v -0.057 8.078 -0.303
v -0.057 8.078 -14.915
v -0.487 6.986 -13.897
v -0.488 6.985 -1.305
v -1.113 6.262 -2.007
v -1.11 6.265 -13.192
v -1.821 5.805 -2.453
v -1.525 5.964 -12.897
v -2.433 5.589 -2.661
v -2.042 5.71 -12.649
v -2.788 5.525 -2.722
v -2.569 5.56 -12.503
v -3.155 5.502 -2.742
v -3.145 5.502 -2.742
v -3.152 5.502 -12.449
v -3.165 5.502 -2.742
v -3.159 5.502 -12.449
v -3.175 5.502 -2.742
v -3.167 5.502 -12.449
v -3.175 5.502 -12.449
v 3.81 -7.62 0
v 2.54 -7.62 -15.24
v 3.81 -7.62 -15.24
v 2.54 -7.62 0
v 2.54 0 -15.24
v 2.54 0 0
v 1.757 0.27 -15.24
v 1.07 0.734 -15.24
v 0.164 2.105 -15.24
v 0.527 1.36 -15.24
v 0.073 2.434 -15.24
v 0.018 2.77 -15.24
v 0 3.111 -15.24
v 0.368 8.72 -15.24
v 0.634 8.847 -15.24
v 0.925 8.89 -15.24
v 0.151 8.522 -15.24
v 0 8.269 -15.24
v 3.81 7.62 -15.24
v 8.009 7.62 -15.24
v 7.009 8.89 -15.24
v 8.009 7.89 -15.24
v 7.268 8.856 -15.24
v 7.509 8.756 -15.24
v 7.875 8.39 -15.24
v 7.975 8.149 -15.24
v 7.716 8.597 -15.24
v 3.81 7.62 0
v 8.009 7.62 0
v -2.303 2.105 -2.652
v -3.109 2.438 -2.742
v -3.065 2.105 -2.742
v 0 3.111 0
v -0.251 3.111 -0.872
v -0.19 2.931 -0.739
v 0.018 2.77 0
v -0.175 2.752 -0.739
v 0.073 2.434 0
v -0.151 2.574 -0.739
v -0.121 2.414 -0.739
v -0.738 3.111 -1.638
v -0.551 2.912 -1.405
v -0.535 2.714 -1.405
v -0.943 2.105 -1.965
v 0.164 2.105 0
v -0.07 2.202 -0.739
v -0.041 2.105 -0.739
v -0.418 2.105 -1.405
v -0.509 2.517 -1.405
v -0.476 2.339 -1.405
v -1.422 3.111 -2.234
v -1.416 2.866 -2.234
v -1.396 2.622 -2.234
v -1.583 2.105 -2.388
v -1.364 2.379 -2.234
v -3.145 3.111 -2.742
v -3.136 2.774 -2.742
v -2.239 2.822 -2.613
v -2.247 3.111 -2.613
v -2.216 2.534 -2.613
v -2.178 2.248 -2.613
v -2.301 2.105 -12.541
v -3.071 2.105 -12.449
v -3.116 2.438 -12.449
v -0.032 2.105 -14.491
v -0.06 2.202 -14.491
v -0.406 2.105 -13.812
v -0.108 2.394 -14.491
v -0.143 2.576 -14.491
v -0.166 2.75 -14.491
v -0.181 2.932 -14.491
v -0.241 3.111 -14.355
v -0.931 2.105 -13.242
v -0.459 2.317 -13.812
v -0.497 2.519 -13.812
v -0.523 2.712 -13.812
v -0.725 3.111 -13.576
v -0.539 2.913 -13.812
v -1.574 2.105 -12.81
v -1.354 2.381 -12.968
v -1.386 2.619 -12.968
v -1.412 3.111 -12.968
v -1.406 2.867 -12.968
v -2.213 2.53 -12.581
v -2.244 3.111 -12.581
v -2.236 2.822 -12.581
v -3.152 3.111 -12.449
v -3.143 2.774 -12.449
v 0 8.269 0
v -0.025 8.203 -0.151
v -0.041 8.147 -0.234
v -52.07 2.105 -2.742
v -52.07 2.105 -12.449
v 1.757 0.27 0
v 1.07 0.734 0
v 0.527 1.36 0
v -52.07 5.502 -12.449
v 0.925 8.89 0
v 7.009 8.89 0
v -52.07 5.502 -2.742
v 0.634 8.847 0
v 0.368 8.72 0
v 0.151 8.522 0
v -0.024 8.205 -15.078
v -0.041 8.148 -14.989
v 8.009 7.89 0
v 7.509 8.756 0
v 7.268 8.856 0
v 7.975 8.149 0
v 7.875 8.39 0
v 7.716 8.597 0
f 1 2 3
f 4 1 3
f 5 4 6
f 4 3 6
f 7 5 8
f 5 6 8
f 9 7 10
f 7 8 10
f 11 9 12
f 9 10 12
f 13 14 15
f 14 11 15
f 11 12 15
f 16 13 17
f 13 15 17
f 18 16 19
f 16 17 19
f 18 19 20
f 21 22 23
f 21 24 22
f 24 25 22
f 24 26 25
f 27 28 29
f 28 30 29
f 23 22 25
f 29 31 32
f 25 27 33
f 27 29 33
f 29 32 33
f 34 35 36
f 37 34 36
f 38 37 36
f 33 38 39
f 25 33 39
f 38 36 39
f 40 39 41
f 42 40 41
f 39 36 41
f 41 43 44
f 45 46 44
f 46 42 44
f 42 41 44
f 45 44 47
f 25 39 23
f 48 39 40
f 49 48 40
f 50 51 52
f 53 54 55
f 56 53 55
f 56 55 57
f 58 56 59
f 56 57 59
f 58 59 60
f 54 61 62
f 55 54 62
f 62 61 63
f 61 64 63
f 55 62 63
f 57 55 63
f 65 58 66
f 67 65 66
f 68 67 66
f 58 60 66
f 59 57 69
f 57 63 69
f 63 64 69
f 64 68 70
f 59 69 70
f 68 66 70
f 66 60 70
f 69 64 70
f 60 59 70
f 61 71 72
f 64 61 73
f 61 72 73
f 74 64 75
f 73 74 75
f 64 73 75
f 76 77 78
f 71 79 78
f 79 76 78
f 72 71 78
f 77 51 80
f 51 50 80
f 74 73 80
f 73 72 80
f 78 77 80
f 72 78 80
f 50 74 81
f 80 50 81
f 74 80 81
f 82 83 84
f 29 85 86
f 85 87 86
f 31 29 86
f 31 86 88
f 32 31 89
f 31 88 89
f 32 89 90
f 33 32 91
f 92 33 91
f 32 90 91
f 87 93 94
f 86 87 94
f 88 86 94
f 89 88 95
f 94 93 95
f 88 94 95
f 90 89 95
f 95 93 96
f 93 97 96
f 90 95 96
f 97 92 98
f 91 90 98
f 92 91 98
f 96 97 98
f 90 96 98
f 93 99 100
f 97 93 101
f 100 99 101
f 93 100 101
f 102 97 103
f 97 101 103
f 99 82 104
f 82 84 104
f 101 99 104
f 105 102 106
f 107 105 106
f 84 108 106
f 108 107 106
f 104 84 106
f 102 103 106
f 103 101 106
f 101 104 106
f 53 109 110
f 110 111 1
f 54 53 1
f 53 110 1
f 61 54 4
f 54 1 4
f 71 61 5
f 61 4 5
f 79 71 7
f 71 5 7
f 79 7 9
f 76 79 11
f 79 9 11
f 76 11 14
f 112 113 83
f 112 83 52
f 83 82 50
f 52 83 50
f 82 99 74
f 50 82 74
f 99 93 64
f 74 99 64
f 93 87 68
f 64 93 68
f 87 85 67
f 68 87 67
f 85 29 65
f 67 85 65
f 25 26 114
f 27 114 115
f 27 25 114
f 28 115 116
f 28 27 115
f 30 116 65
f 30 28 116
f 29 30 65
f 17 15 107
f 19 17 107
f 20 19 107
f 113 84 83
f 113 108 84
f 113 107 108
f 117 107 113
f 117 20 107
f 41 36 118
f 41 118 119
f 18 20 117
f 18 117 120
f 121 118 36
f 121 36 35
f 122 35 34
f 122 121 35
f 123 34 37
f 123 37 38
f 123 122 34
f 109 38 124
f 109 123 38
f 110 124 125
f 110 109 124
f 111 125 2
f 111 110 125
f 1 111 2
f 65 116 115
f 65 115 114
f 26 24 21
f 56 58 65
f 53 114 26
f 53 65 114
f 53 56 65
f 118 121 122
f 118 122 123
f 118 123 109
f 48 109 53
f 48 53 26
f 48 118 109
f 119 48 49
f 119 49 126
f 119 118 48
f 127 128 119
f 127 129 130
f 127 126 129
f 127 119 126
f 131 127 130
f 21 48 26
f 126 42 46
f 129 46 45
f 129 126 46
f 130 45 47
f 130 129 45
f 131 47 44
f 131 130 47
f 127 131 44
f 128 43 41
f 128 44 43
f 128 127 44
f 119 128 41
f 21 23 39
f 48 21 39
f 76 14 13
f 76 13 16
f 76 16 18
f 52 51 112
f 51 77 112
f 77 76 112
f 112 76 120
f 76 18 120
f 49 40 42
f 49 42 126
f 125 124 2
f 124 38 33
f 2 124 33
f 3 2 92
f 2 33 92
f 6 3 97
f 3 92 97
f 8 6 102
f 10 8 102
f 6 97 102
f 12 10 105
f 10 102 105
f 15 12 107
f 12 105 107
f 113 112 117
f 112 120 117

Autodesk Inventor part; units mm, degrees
ref_plane "YZ Plane" through (0, 0, 0) normal (1, 0, 0) x (0, 1, 0)
ref_plane "XZ Plane" through (0, 0, 0) normal (0, 1, 0) x (-1, 0, 0)
ref_plane "XY Plane" through (0, 0, 0) normal (0, 0, 1) x (1, 0, 0)
sketch "Sketch1" plane through (0, 0, 0) normal (1, 0, 0) x (0, 1, 0)
  line L0 (0, 0) -> (7.62, 0)
  line L1 (7.62, 0) -> (7.62, -15.24)
  line L2 (7.62, -15.24) -> (0, -15.24)
  line L3 (0, -15.24) -> (0, 0)
  dimension "d0" = 7.62
  dimension "d1" = 15.24
extrude "Extrusion1" add sketch "Sketch1" along normal blind 7.62
ref_plane "Work Plane1" through (0, 3.81, 0) normal (0, 1, 0) x (1, 0, 0)
sketch "Sketch3" plane through (0, 0, 0) normal (-1, 0, 0) x (0, 0, 1)
  line L0 (-2.7422, 2.1047) -> (-12.4487, 2.1047)
  line L1 (-12.4487, 2.1047) -> (-12.4487, 5.5015)
  line L2 (-12.4487, 5.5015) -> (-2.7422, 5.5015)
  line L3 (-2.7422, 5.5015) -> (-2.7422, 2.1047)
  point P0 (0, 0)
extrude "Extrusion2" add sketch "Sketch3" along normal blind 1.27
sketch "Sketch4" plane through (0, 5.5015, -2.7422) normal (0, 1, 0) x (1, 0, 0)
  line L0 (-1.27, 9.7065) -> (-1.27, 0) projected
  line L1 (-1.27, 0) -> (-52.07, 0)
  line L2 (-52.07, 0) -> (-52.07, 9.7065)
  line L3 (-52.07, 9.7065) -> (-1.27, 9.7065)
  line L4 (-1.27, 9.7065) -> (-1.27, 0)
  point P0 (0, -2.7422)
  dimension "d6" = 50.8
extrude "Extrusion3" add sketch "Sketch4" against normal up to surface (3.3968 mm away)
sketch "Sketch5" plane through (7.62, 0, 0) normal (1, 0, 0) x (0, 0, -1)
  line L0 (15.24, 7.62) -> (15.24, 0) projected
  line L1 (0, 7.62) -> (15.24, 7.62) projected
  line L2 (15.24, 0) -> (0, 0)
  line L3 (0, 0) -> (0, 7.62)
  line L4 (0, 7.62) -> (15.24, 7.62)
  line L5 (15.24, 7.62) -> (15.24, 0)
extrude "Extrusion4" cut sketch "Sketch5" against normal blind 3.81
sketch "Sketch6" plane through (0, 7.62, 0) normal (0, 1, 0) x (1, 0, 0)
  line L0 (0, 15.24) -> (3.81, 15.24) projected
  line L1 (0, 15.24) -> (8.0091, 15.24)
  line L2 (8.0091, 15.24) -> (8.0091, 0)
  line L3 (8.0091, 0) -> (0, 0)
  line L4 (0, 0) -> (0, 15.24)
extrude "Extrusion5" add sketch "Sketch6" along normal blind 1.27
sketch "Sketch7" plane through (0, 0, 0) normal (0, 0, 1) x (1, 0, 0)
  line L0 (3.81, 0) -> (2.54, 0)
  line L1 (2.54, 0) -> (2.54, -7.62)
  line L2 (2.54, -7.62) -> (3.81, -7.62)
  line L3 (3.81, -7.62) -> (3.81, 0)
  point P0 (0, 0)
  dimension "d13" = 1.27
  dimension "d14" = 7.62
extrude "Extrusion6" add sketch "Sketch7" against normal up to surface (15.24 mm away)
fillet "Fillet1" radius 3.175 5 edges at (0, 0, -7.62) (0, 3.8031, -2.7422) (0, 2.1047, -7.5954) (0, 3.8031, -12.4487) (0, 5.5015, -7.5954)
fillet "Fillet2" radius 1 1 edges at (8.0091, 8.89, -7.62)
fillet "Fillet3" radius 1 1 edges at (0, 8.89, -7.62)
properties part number "straightBar"
